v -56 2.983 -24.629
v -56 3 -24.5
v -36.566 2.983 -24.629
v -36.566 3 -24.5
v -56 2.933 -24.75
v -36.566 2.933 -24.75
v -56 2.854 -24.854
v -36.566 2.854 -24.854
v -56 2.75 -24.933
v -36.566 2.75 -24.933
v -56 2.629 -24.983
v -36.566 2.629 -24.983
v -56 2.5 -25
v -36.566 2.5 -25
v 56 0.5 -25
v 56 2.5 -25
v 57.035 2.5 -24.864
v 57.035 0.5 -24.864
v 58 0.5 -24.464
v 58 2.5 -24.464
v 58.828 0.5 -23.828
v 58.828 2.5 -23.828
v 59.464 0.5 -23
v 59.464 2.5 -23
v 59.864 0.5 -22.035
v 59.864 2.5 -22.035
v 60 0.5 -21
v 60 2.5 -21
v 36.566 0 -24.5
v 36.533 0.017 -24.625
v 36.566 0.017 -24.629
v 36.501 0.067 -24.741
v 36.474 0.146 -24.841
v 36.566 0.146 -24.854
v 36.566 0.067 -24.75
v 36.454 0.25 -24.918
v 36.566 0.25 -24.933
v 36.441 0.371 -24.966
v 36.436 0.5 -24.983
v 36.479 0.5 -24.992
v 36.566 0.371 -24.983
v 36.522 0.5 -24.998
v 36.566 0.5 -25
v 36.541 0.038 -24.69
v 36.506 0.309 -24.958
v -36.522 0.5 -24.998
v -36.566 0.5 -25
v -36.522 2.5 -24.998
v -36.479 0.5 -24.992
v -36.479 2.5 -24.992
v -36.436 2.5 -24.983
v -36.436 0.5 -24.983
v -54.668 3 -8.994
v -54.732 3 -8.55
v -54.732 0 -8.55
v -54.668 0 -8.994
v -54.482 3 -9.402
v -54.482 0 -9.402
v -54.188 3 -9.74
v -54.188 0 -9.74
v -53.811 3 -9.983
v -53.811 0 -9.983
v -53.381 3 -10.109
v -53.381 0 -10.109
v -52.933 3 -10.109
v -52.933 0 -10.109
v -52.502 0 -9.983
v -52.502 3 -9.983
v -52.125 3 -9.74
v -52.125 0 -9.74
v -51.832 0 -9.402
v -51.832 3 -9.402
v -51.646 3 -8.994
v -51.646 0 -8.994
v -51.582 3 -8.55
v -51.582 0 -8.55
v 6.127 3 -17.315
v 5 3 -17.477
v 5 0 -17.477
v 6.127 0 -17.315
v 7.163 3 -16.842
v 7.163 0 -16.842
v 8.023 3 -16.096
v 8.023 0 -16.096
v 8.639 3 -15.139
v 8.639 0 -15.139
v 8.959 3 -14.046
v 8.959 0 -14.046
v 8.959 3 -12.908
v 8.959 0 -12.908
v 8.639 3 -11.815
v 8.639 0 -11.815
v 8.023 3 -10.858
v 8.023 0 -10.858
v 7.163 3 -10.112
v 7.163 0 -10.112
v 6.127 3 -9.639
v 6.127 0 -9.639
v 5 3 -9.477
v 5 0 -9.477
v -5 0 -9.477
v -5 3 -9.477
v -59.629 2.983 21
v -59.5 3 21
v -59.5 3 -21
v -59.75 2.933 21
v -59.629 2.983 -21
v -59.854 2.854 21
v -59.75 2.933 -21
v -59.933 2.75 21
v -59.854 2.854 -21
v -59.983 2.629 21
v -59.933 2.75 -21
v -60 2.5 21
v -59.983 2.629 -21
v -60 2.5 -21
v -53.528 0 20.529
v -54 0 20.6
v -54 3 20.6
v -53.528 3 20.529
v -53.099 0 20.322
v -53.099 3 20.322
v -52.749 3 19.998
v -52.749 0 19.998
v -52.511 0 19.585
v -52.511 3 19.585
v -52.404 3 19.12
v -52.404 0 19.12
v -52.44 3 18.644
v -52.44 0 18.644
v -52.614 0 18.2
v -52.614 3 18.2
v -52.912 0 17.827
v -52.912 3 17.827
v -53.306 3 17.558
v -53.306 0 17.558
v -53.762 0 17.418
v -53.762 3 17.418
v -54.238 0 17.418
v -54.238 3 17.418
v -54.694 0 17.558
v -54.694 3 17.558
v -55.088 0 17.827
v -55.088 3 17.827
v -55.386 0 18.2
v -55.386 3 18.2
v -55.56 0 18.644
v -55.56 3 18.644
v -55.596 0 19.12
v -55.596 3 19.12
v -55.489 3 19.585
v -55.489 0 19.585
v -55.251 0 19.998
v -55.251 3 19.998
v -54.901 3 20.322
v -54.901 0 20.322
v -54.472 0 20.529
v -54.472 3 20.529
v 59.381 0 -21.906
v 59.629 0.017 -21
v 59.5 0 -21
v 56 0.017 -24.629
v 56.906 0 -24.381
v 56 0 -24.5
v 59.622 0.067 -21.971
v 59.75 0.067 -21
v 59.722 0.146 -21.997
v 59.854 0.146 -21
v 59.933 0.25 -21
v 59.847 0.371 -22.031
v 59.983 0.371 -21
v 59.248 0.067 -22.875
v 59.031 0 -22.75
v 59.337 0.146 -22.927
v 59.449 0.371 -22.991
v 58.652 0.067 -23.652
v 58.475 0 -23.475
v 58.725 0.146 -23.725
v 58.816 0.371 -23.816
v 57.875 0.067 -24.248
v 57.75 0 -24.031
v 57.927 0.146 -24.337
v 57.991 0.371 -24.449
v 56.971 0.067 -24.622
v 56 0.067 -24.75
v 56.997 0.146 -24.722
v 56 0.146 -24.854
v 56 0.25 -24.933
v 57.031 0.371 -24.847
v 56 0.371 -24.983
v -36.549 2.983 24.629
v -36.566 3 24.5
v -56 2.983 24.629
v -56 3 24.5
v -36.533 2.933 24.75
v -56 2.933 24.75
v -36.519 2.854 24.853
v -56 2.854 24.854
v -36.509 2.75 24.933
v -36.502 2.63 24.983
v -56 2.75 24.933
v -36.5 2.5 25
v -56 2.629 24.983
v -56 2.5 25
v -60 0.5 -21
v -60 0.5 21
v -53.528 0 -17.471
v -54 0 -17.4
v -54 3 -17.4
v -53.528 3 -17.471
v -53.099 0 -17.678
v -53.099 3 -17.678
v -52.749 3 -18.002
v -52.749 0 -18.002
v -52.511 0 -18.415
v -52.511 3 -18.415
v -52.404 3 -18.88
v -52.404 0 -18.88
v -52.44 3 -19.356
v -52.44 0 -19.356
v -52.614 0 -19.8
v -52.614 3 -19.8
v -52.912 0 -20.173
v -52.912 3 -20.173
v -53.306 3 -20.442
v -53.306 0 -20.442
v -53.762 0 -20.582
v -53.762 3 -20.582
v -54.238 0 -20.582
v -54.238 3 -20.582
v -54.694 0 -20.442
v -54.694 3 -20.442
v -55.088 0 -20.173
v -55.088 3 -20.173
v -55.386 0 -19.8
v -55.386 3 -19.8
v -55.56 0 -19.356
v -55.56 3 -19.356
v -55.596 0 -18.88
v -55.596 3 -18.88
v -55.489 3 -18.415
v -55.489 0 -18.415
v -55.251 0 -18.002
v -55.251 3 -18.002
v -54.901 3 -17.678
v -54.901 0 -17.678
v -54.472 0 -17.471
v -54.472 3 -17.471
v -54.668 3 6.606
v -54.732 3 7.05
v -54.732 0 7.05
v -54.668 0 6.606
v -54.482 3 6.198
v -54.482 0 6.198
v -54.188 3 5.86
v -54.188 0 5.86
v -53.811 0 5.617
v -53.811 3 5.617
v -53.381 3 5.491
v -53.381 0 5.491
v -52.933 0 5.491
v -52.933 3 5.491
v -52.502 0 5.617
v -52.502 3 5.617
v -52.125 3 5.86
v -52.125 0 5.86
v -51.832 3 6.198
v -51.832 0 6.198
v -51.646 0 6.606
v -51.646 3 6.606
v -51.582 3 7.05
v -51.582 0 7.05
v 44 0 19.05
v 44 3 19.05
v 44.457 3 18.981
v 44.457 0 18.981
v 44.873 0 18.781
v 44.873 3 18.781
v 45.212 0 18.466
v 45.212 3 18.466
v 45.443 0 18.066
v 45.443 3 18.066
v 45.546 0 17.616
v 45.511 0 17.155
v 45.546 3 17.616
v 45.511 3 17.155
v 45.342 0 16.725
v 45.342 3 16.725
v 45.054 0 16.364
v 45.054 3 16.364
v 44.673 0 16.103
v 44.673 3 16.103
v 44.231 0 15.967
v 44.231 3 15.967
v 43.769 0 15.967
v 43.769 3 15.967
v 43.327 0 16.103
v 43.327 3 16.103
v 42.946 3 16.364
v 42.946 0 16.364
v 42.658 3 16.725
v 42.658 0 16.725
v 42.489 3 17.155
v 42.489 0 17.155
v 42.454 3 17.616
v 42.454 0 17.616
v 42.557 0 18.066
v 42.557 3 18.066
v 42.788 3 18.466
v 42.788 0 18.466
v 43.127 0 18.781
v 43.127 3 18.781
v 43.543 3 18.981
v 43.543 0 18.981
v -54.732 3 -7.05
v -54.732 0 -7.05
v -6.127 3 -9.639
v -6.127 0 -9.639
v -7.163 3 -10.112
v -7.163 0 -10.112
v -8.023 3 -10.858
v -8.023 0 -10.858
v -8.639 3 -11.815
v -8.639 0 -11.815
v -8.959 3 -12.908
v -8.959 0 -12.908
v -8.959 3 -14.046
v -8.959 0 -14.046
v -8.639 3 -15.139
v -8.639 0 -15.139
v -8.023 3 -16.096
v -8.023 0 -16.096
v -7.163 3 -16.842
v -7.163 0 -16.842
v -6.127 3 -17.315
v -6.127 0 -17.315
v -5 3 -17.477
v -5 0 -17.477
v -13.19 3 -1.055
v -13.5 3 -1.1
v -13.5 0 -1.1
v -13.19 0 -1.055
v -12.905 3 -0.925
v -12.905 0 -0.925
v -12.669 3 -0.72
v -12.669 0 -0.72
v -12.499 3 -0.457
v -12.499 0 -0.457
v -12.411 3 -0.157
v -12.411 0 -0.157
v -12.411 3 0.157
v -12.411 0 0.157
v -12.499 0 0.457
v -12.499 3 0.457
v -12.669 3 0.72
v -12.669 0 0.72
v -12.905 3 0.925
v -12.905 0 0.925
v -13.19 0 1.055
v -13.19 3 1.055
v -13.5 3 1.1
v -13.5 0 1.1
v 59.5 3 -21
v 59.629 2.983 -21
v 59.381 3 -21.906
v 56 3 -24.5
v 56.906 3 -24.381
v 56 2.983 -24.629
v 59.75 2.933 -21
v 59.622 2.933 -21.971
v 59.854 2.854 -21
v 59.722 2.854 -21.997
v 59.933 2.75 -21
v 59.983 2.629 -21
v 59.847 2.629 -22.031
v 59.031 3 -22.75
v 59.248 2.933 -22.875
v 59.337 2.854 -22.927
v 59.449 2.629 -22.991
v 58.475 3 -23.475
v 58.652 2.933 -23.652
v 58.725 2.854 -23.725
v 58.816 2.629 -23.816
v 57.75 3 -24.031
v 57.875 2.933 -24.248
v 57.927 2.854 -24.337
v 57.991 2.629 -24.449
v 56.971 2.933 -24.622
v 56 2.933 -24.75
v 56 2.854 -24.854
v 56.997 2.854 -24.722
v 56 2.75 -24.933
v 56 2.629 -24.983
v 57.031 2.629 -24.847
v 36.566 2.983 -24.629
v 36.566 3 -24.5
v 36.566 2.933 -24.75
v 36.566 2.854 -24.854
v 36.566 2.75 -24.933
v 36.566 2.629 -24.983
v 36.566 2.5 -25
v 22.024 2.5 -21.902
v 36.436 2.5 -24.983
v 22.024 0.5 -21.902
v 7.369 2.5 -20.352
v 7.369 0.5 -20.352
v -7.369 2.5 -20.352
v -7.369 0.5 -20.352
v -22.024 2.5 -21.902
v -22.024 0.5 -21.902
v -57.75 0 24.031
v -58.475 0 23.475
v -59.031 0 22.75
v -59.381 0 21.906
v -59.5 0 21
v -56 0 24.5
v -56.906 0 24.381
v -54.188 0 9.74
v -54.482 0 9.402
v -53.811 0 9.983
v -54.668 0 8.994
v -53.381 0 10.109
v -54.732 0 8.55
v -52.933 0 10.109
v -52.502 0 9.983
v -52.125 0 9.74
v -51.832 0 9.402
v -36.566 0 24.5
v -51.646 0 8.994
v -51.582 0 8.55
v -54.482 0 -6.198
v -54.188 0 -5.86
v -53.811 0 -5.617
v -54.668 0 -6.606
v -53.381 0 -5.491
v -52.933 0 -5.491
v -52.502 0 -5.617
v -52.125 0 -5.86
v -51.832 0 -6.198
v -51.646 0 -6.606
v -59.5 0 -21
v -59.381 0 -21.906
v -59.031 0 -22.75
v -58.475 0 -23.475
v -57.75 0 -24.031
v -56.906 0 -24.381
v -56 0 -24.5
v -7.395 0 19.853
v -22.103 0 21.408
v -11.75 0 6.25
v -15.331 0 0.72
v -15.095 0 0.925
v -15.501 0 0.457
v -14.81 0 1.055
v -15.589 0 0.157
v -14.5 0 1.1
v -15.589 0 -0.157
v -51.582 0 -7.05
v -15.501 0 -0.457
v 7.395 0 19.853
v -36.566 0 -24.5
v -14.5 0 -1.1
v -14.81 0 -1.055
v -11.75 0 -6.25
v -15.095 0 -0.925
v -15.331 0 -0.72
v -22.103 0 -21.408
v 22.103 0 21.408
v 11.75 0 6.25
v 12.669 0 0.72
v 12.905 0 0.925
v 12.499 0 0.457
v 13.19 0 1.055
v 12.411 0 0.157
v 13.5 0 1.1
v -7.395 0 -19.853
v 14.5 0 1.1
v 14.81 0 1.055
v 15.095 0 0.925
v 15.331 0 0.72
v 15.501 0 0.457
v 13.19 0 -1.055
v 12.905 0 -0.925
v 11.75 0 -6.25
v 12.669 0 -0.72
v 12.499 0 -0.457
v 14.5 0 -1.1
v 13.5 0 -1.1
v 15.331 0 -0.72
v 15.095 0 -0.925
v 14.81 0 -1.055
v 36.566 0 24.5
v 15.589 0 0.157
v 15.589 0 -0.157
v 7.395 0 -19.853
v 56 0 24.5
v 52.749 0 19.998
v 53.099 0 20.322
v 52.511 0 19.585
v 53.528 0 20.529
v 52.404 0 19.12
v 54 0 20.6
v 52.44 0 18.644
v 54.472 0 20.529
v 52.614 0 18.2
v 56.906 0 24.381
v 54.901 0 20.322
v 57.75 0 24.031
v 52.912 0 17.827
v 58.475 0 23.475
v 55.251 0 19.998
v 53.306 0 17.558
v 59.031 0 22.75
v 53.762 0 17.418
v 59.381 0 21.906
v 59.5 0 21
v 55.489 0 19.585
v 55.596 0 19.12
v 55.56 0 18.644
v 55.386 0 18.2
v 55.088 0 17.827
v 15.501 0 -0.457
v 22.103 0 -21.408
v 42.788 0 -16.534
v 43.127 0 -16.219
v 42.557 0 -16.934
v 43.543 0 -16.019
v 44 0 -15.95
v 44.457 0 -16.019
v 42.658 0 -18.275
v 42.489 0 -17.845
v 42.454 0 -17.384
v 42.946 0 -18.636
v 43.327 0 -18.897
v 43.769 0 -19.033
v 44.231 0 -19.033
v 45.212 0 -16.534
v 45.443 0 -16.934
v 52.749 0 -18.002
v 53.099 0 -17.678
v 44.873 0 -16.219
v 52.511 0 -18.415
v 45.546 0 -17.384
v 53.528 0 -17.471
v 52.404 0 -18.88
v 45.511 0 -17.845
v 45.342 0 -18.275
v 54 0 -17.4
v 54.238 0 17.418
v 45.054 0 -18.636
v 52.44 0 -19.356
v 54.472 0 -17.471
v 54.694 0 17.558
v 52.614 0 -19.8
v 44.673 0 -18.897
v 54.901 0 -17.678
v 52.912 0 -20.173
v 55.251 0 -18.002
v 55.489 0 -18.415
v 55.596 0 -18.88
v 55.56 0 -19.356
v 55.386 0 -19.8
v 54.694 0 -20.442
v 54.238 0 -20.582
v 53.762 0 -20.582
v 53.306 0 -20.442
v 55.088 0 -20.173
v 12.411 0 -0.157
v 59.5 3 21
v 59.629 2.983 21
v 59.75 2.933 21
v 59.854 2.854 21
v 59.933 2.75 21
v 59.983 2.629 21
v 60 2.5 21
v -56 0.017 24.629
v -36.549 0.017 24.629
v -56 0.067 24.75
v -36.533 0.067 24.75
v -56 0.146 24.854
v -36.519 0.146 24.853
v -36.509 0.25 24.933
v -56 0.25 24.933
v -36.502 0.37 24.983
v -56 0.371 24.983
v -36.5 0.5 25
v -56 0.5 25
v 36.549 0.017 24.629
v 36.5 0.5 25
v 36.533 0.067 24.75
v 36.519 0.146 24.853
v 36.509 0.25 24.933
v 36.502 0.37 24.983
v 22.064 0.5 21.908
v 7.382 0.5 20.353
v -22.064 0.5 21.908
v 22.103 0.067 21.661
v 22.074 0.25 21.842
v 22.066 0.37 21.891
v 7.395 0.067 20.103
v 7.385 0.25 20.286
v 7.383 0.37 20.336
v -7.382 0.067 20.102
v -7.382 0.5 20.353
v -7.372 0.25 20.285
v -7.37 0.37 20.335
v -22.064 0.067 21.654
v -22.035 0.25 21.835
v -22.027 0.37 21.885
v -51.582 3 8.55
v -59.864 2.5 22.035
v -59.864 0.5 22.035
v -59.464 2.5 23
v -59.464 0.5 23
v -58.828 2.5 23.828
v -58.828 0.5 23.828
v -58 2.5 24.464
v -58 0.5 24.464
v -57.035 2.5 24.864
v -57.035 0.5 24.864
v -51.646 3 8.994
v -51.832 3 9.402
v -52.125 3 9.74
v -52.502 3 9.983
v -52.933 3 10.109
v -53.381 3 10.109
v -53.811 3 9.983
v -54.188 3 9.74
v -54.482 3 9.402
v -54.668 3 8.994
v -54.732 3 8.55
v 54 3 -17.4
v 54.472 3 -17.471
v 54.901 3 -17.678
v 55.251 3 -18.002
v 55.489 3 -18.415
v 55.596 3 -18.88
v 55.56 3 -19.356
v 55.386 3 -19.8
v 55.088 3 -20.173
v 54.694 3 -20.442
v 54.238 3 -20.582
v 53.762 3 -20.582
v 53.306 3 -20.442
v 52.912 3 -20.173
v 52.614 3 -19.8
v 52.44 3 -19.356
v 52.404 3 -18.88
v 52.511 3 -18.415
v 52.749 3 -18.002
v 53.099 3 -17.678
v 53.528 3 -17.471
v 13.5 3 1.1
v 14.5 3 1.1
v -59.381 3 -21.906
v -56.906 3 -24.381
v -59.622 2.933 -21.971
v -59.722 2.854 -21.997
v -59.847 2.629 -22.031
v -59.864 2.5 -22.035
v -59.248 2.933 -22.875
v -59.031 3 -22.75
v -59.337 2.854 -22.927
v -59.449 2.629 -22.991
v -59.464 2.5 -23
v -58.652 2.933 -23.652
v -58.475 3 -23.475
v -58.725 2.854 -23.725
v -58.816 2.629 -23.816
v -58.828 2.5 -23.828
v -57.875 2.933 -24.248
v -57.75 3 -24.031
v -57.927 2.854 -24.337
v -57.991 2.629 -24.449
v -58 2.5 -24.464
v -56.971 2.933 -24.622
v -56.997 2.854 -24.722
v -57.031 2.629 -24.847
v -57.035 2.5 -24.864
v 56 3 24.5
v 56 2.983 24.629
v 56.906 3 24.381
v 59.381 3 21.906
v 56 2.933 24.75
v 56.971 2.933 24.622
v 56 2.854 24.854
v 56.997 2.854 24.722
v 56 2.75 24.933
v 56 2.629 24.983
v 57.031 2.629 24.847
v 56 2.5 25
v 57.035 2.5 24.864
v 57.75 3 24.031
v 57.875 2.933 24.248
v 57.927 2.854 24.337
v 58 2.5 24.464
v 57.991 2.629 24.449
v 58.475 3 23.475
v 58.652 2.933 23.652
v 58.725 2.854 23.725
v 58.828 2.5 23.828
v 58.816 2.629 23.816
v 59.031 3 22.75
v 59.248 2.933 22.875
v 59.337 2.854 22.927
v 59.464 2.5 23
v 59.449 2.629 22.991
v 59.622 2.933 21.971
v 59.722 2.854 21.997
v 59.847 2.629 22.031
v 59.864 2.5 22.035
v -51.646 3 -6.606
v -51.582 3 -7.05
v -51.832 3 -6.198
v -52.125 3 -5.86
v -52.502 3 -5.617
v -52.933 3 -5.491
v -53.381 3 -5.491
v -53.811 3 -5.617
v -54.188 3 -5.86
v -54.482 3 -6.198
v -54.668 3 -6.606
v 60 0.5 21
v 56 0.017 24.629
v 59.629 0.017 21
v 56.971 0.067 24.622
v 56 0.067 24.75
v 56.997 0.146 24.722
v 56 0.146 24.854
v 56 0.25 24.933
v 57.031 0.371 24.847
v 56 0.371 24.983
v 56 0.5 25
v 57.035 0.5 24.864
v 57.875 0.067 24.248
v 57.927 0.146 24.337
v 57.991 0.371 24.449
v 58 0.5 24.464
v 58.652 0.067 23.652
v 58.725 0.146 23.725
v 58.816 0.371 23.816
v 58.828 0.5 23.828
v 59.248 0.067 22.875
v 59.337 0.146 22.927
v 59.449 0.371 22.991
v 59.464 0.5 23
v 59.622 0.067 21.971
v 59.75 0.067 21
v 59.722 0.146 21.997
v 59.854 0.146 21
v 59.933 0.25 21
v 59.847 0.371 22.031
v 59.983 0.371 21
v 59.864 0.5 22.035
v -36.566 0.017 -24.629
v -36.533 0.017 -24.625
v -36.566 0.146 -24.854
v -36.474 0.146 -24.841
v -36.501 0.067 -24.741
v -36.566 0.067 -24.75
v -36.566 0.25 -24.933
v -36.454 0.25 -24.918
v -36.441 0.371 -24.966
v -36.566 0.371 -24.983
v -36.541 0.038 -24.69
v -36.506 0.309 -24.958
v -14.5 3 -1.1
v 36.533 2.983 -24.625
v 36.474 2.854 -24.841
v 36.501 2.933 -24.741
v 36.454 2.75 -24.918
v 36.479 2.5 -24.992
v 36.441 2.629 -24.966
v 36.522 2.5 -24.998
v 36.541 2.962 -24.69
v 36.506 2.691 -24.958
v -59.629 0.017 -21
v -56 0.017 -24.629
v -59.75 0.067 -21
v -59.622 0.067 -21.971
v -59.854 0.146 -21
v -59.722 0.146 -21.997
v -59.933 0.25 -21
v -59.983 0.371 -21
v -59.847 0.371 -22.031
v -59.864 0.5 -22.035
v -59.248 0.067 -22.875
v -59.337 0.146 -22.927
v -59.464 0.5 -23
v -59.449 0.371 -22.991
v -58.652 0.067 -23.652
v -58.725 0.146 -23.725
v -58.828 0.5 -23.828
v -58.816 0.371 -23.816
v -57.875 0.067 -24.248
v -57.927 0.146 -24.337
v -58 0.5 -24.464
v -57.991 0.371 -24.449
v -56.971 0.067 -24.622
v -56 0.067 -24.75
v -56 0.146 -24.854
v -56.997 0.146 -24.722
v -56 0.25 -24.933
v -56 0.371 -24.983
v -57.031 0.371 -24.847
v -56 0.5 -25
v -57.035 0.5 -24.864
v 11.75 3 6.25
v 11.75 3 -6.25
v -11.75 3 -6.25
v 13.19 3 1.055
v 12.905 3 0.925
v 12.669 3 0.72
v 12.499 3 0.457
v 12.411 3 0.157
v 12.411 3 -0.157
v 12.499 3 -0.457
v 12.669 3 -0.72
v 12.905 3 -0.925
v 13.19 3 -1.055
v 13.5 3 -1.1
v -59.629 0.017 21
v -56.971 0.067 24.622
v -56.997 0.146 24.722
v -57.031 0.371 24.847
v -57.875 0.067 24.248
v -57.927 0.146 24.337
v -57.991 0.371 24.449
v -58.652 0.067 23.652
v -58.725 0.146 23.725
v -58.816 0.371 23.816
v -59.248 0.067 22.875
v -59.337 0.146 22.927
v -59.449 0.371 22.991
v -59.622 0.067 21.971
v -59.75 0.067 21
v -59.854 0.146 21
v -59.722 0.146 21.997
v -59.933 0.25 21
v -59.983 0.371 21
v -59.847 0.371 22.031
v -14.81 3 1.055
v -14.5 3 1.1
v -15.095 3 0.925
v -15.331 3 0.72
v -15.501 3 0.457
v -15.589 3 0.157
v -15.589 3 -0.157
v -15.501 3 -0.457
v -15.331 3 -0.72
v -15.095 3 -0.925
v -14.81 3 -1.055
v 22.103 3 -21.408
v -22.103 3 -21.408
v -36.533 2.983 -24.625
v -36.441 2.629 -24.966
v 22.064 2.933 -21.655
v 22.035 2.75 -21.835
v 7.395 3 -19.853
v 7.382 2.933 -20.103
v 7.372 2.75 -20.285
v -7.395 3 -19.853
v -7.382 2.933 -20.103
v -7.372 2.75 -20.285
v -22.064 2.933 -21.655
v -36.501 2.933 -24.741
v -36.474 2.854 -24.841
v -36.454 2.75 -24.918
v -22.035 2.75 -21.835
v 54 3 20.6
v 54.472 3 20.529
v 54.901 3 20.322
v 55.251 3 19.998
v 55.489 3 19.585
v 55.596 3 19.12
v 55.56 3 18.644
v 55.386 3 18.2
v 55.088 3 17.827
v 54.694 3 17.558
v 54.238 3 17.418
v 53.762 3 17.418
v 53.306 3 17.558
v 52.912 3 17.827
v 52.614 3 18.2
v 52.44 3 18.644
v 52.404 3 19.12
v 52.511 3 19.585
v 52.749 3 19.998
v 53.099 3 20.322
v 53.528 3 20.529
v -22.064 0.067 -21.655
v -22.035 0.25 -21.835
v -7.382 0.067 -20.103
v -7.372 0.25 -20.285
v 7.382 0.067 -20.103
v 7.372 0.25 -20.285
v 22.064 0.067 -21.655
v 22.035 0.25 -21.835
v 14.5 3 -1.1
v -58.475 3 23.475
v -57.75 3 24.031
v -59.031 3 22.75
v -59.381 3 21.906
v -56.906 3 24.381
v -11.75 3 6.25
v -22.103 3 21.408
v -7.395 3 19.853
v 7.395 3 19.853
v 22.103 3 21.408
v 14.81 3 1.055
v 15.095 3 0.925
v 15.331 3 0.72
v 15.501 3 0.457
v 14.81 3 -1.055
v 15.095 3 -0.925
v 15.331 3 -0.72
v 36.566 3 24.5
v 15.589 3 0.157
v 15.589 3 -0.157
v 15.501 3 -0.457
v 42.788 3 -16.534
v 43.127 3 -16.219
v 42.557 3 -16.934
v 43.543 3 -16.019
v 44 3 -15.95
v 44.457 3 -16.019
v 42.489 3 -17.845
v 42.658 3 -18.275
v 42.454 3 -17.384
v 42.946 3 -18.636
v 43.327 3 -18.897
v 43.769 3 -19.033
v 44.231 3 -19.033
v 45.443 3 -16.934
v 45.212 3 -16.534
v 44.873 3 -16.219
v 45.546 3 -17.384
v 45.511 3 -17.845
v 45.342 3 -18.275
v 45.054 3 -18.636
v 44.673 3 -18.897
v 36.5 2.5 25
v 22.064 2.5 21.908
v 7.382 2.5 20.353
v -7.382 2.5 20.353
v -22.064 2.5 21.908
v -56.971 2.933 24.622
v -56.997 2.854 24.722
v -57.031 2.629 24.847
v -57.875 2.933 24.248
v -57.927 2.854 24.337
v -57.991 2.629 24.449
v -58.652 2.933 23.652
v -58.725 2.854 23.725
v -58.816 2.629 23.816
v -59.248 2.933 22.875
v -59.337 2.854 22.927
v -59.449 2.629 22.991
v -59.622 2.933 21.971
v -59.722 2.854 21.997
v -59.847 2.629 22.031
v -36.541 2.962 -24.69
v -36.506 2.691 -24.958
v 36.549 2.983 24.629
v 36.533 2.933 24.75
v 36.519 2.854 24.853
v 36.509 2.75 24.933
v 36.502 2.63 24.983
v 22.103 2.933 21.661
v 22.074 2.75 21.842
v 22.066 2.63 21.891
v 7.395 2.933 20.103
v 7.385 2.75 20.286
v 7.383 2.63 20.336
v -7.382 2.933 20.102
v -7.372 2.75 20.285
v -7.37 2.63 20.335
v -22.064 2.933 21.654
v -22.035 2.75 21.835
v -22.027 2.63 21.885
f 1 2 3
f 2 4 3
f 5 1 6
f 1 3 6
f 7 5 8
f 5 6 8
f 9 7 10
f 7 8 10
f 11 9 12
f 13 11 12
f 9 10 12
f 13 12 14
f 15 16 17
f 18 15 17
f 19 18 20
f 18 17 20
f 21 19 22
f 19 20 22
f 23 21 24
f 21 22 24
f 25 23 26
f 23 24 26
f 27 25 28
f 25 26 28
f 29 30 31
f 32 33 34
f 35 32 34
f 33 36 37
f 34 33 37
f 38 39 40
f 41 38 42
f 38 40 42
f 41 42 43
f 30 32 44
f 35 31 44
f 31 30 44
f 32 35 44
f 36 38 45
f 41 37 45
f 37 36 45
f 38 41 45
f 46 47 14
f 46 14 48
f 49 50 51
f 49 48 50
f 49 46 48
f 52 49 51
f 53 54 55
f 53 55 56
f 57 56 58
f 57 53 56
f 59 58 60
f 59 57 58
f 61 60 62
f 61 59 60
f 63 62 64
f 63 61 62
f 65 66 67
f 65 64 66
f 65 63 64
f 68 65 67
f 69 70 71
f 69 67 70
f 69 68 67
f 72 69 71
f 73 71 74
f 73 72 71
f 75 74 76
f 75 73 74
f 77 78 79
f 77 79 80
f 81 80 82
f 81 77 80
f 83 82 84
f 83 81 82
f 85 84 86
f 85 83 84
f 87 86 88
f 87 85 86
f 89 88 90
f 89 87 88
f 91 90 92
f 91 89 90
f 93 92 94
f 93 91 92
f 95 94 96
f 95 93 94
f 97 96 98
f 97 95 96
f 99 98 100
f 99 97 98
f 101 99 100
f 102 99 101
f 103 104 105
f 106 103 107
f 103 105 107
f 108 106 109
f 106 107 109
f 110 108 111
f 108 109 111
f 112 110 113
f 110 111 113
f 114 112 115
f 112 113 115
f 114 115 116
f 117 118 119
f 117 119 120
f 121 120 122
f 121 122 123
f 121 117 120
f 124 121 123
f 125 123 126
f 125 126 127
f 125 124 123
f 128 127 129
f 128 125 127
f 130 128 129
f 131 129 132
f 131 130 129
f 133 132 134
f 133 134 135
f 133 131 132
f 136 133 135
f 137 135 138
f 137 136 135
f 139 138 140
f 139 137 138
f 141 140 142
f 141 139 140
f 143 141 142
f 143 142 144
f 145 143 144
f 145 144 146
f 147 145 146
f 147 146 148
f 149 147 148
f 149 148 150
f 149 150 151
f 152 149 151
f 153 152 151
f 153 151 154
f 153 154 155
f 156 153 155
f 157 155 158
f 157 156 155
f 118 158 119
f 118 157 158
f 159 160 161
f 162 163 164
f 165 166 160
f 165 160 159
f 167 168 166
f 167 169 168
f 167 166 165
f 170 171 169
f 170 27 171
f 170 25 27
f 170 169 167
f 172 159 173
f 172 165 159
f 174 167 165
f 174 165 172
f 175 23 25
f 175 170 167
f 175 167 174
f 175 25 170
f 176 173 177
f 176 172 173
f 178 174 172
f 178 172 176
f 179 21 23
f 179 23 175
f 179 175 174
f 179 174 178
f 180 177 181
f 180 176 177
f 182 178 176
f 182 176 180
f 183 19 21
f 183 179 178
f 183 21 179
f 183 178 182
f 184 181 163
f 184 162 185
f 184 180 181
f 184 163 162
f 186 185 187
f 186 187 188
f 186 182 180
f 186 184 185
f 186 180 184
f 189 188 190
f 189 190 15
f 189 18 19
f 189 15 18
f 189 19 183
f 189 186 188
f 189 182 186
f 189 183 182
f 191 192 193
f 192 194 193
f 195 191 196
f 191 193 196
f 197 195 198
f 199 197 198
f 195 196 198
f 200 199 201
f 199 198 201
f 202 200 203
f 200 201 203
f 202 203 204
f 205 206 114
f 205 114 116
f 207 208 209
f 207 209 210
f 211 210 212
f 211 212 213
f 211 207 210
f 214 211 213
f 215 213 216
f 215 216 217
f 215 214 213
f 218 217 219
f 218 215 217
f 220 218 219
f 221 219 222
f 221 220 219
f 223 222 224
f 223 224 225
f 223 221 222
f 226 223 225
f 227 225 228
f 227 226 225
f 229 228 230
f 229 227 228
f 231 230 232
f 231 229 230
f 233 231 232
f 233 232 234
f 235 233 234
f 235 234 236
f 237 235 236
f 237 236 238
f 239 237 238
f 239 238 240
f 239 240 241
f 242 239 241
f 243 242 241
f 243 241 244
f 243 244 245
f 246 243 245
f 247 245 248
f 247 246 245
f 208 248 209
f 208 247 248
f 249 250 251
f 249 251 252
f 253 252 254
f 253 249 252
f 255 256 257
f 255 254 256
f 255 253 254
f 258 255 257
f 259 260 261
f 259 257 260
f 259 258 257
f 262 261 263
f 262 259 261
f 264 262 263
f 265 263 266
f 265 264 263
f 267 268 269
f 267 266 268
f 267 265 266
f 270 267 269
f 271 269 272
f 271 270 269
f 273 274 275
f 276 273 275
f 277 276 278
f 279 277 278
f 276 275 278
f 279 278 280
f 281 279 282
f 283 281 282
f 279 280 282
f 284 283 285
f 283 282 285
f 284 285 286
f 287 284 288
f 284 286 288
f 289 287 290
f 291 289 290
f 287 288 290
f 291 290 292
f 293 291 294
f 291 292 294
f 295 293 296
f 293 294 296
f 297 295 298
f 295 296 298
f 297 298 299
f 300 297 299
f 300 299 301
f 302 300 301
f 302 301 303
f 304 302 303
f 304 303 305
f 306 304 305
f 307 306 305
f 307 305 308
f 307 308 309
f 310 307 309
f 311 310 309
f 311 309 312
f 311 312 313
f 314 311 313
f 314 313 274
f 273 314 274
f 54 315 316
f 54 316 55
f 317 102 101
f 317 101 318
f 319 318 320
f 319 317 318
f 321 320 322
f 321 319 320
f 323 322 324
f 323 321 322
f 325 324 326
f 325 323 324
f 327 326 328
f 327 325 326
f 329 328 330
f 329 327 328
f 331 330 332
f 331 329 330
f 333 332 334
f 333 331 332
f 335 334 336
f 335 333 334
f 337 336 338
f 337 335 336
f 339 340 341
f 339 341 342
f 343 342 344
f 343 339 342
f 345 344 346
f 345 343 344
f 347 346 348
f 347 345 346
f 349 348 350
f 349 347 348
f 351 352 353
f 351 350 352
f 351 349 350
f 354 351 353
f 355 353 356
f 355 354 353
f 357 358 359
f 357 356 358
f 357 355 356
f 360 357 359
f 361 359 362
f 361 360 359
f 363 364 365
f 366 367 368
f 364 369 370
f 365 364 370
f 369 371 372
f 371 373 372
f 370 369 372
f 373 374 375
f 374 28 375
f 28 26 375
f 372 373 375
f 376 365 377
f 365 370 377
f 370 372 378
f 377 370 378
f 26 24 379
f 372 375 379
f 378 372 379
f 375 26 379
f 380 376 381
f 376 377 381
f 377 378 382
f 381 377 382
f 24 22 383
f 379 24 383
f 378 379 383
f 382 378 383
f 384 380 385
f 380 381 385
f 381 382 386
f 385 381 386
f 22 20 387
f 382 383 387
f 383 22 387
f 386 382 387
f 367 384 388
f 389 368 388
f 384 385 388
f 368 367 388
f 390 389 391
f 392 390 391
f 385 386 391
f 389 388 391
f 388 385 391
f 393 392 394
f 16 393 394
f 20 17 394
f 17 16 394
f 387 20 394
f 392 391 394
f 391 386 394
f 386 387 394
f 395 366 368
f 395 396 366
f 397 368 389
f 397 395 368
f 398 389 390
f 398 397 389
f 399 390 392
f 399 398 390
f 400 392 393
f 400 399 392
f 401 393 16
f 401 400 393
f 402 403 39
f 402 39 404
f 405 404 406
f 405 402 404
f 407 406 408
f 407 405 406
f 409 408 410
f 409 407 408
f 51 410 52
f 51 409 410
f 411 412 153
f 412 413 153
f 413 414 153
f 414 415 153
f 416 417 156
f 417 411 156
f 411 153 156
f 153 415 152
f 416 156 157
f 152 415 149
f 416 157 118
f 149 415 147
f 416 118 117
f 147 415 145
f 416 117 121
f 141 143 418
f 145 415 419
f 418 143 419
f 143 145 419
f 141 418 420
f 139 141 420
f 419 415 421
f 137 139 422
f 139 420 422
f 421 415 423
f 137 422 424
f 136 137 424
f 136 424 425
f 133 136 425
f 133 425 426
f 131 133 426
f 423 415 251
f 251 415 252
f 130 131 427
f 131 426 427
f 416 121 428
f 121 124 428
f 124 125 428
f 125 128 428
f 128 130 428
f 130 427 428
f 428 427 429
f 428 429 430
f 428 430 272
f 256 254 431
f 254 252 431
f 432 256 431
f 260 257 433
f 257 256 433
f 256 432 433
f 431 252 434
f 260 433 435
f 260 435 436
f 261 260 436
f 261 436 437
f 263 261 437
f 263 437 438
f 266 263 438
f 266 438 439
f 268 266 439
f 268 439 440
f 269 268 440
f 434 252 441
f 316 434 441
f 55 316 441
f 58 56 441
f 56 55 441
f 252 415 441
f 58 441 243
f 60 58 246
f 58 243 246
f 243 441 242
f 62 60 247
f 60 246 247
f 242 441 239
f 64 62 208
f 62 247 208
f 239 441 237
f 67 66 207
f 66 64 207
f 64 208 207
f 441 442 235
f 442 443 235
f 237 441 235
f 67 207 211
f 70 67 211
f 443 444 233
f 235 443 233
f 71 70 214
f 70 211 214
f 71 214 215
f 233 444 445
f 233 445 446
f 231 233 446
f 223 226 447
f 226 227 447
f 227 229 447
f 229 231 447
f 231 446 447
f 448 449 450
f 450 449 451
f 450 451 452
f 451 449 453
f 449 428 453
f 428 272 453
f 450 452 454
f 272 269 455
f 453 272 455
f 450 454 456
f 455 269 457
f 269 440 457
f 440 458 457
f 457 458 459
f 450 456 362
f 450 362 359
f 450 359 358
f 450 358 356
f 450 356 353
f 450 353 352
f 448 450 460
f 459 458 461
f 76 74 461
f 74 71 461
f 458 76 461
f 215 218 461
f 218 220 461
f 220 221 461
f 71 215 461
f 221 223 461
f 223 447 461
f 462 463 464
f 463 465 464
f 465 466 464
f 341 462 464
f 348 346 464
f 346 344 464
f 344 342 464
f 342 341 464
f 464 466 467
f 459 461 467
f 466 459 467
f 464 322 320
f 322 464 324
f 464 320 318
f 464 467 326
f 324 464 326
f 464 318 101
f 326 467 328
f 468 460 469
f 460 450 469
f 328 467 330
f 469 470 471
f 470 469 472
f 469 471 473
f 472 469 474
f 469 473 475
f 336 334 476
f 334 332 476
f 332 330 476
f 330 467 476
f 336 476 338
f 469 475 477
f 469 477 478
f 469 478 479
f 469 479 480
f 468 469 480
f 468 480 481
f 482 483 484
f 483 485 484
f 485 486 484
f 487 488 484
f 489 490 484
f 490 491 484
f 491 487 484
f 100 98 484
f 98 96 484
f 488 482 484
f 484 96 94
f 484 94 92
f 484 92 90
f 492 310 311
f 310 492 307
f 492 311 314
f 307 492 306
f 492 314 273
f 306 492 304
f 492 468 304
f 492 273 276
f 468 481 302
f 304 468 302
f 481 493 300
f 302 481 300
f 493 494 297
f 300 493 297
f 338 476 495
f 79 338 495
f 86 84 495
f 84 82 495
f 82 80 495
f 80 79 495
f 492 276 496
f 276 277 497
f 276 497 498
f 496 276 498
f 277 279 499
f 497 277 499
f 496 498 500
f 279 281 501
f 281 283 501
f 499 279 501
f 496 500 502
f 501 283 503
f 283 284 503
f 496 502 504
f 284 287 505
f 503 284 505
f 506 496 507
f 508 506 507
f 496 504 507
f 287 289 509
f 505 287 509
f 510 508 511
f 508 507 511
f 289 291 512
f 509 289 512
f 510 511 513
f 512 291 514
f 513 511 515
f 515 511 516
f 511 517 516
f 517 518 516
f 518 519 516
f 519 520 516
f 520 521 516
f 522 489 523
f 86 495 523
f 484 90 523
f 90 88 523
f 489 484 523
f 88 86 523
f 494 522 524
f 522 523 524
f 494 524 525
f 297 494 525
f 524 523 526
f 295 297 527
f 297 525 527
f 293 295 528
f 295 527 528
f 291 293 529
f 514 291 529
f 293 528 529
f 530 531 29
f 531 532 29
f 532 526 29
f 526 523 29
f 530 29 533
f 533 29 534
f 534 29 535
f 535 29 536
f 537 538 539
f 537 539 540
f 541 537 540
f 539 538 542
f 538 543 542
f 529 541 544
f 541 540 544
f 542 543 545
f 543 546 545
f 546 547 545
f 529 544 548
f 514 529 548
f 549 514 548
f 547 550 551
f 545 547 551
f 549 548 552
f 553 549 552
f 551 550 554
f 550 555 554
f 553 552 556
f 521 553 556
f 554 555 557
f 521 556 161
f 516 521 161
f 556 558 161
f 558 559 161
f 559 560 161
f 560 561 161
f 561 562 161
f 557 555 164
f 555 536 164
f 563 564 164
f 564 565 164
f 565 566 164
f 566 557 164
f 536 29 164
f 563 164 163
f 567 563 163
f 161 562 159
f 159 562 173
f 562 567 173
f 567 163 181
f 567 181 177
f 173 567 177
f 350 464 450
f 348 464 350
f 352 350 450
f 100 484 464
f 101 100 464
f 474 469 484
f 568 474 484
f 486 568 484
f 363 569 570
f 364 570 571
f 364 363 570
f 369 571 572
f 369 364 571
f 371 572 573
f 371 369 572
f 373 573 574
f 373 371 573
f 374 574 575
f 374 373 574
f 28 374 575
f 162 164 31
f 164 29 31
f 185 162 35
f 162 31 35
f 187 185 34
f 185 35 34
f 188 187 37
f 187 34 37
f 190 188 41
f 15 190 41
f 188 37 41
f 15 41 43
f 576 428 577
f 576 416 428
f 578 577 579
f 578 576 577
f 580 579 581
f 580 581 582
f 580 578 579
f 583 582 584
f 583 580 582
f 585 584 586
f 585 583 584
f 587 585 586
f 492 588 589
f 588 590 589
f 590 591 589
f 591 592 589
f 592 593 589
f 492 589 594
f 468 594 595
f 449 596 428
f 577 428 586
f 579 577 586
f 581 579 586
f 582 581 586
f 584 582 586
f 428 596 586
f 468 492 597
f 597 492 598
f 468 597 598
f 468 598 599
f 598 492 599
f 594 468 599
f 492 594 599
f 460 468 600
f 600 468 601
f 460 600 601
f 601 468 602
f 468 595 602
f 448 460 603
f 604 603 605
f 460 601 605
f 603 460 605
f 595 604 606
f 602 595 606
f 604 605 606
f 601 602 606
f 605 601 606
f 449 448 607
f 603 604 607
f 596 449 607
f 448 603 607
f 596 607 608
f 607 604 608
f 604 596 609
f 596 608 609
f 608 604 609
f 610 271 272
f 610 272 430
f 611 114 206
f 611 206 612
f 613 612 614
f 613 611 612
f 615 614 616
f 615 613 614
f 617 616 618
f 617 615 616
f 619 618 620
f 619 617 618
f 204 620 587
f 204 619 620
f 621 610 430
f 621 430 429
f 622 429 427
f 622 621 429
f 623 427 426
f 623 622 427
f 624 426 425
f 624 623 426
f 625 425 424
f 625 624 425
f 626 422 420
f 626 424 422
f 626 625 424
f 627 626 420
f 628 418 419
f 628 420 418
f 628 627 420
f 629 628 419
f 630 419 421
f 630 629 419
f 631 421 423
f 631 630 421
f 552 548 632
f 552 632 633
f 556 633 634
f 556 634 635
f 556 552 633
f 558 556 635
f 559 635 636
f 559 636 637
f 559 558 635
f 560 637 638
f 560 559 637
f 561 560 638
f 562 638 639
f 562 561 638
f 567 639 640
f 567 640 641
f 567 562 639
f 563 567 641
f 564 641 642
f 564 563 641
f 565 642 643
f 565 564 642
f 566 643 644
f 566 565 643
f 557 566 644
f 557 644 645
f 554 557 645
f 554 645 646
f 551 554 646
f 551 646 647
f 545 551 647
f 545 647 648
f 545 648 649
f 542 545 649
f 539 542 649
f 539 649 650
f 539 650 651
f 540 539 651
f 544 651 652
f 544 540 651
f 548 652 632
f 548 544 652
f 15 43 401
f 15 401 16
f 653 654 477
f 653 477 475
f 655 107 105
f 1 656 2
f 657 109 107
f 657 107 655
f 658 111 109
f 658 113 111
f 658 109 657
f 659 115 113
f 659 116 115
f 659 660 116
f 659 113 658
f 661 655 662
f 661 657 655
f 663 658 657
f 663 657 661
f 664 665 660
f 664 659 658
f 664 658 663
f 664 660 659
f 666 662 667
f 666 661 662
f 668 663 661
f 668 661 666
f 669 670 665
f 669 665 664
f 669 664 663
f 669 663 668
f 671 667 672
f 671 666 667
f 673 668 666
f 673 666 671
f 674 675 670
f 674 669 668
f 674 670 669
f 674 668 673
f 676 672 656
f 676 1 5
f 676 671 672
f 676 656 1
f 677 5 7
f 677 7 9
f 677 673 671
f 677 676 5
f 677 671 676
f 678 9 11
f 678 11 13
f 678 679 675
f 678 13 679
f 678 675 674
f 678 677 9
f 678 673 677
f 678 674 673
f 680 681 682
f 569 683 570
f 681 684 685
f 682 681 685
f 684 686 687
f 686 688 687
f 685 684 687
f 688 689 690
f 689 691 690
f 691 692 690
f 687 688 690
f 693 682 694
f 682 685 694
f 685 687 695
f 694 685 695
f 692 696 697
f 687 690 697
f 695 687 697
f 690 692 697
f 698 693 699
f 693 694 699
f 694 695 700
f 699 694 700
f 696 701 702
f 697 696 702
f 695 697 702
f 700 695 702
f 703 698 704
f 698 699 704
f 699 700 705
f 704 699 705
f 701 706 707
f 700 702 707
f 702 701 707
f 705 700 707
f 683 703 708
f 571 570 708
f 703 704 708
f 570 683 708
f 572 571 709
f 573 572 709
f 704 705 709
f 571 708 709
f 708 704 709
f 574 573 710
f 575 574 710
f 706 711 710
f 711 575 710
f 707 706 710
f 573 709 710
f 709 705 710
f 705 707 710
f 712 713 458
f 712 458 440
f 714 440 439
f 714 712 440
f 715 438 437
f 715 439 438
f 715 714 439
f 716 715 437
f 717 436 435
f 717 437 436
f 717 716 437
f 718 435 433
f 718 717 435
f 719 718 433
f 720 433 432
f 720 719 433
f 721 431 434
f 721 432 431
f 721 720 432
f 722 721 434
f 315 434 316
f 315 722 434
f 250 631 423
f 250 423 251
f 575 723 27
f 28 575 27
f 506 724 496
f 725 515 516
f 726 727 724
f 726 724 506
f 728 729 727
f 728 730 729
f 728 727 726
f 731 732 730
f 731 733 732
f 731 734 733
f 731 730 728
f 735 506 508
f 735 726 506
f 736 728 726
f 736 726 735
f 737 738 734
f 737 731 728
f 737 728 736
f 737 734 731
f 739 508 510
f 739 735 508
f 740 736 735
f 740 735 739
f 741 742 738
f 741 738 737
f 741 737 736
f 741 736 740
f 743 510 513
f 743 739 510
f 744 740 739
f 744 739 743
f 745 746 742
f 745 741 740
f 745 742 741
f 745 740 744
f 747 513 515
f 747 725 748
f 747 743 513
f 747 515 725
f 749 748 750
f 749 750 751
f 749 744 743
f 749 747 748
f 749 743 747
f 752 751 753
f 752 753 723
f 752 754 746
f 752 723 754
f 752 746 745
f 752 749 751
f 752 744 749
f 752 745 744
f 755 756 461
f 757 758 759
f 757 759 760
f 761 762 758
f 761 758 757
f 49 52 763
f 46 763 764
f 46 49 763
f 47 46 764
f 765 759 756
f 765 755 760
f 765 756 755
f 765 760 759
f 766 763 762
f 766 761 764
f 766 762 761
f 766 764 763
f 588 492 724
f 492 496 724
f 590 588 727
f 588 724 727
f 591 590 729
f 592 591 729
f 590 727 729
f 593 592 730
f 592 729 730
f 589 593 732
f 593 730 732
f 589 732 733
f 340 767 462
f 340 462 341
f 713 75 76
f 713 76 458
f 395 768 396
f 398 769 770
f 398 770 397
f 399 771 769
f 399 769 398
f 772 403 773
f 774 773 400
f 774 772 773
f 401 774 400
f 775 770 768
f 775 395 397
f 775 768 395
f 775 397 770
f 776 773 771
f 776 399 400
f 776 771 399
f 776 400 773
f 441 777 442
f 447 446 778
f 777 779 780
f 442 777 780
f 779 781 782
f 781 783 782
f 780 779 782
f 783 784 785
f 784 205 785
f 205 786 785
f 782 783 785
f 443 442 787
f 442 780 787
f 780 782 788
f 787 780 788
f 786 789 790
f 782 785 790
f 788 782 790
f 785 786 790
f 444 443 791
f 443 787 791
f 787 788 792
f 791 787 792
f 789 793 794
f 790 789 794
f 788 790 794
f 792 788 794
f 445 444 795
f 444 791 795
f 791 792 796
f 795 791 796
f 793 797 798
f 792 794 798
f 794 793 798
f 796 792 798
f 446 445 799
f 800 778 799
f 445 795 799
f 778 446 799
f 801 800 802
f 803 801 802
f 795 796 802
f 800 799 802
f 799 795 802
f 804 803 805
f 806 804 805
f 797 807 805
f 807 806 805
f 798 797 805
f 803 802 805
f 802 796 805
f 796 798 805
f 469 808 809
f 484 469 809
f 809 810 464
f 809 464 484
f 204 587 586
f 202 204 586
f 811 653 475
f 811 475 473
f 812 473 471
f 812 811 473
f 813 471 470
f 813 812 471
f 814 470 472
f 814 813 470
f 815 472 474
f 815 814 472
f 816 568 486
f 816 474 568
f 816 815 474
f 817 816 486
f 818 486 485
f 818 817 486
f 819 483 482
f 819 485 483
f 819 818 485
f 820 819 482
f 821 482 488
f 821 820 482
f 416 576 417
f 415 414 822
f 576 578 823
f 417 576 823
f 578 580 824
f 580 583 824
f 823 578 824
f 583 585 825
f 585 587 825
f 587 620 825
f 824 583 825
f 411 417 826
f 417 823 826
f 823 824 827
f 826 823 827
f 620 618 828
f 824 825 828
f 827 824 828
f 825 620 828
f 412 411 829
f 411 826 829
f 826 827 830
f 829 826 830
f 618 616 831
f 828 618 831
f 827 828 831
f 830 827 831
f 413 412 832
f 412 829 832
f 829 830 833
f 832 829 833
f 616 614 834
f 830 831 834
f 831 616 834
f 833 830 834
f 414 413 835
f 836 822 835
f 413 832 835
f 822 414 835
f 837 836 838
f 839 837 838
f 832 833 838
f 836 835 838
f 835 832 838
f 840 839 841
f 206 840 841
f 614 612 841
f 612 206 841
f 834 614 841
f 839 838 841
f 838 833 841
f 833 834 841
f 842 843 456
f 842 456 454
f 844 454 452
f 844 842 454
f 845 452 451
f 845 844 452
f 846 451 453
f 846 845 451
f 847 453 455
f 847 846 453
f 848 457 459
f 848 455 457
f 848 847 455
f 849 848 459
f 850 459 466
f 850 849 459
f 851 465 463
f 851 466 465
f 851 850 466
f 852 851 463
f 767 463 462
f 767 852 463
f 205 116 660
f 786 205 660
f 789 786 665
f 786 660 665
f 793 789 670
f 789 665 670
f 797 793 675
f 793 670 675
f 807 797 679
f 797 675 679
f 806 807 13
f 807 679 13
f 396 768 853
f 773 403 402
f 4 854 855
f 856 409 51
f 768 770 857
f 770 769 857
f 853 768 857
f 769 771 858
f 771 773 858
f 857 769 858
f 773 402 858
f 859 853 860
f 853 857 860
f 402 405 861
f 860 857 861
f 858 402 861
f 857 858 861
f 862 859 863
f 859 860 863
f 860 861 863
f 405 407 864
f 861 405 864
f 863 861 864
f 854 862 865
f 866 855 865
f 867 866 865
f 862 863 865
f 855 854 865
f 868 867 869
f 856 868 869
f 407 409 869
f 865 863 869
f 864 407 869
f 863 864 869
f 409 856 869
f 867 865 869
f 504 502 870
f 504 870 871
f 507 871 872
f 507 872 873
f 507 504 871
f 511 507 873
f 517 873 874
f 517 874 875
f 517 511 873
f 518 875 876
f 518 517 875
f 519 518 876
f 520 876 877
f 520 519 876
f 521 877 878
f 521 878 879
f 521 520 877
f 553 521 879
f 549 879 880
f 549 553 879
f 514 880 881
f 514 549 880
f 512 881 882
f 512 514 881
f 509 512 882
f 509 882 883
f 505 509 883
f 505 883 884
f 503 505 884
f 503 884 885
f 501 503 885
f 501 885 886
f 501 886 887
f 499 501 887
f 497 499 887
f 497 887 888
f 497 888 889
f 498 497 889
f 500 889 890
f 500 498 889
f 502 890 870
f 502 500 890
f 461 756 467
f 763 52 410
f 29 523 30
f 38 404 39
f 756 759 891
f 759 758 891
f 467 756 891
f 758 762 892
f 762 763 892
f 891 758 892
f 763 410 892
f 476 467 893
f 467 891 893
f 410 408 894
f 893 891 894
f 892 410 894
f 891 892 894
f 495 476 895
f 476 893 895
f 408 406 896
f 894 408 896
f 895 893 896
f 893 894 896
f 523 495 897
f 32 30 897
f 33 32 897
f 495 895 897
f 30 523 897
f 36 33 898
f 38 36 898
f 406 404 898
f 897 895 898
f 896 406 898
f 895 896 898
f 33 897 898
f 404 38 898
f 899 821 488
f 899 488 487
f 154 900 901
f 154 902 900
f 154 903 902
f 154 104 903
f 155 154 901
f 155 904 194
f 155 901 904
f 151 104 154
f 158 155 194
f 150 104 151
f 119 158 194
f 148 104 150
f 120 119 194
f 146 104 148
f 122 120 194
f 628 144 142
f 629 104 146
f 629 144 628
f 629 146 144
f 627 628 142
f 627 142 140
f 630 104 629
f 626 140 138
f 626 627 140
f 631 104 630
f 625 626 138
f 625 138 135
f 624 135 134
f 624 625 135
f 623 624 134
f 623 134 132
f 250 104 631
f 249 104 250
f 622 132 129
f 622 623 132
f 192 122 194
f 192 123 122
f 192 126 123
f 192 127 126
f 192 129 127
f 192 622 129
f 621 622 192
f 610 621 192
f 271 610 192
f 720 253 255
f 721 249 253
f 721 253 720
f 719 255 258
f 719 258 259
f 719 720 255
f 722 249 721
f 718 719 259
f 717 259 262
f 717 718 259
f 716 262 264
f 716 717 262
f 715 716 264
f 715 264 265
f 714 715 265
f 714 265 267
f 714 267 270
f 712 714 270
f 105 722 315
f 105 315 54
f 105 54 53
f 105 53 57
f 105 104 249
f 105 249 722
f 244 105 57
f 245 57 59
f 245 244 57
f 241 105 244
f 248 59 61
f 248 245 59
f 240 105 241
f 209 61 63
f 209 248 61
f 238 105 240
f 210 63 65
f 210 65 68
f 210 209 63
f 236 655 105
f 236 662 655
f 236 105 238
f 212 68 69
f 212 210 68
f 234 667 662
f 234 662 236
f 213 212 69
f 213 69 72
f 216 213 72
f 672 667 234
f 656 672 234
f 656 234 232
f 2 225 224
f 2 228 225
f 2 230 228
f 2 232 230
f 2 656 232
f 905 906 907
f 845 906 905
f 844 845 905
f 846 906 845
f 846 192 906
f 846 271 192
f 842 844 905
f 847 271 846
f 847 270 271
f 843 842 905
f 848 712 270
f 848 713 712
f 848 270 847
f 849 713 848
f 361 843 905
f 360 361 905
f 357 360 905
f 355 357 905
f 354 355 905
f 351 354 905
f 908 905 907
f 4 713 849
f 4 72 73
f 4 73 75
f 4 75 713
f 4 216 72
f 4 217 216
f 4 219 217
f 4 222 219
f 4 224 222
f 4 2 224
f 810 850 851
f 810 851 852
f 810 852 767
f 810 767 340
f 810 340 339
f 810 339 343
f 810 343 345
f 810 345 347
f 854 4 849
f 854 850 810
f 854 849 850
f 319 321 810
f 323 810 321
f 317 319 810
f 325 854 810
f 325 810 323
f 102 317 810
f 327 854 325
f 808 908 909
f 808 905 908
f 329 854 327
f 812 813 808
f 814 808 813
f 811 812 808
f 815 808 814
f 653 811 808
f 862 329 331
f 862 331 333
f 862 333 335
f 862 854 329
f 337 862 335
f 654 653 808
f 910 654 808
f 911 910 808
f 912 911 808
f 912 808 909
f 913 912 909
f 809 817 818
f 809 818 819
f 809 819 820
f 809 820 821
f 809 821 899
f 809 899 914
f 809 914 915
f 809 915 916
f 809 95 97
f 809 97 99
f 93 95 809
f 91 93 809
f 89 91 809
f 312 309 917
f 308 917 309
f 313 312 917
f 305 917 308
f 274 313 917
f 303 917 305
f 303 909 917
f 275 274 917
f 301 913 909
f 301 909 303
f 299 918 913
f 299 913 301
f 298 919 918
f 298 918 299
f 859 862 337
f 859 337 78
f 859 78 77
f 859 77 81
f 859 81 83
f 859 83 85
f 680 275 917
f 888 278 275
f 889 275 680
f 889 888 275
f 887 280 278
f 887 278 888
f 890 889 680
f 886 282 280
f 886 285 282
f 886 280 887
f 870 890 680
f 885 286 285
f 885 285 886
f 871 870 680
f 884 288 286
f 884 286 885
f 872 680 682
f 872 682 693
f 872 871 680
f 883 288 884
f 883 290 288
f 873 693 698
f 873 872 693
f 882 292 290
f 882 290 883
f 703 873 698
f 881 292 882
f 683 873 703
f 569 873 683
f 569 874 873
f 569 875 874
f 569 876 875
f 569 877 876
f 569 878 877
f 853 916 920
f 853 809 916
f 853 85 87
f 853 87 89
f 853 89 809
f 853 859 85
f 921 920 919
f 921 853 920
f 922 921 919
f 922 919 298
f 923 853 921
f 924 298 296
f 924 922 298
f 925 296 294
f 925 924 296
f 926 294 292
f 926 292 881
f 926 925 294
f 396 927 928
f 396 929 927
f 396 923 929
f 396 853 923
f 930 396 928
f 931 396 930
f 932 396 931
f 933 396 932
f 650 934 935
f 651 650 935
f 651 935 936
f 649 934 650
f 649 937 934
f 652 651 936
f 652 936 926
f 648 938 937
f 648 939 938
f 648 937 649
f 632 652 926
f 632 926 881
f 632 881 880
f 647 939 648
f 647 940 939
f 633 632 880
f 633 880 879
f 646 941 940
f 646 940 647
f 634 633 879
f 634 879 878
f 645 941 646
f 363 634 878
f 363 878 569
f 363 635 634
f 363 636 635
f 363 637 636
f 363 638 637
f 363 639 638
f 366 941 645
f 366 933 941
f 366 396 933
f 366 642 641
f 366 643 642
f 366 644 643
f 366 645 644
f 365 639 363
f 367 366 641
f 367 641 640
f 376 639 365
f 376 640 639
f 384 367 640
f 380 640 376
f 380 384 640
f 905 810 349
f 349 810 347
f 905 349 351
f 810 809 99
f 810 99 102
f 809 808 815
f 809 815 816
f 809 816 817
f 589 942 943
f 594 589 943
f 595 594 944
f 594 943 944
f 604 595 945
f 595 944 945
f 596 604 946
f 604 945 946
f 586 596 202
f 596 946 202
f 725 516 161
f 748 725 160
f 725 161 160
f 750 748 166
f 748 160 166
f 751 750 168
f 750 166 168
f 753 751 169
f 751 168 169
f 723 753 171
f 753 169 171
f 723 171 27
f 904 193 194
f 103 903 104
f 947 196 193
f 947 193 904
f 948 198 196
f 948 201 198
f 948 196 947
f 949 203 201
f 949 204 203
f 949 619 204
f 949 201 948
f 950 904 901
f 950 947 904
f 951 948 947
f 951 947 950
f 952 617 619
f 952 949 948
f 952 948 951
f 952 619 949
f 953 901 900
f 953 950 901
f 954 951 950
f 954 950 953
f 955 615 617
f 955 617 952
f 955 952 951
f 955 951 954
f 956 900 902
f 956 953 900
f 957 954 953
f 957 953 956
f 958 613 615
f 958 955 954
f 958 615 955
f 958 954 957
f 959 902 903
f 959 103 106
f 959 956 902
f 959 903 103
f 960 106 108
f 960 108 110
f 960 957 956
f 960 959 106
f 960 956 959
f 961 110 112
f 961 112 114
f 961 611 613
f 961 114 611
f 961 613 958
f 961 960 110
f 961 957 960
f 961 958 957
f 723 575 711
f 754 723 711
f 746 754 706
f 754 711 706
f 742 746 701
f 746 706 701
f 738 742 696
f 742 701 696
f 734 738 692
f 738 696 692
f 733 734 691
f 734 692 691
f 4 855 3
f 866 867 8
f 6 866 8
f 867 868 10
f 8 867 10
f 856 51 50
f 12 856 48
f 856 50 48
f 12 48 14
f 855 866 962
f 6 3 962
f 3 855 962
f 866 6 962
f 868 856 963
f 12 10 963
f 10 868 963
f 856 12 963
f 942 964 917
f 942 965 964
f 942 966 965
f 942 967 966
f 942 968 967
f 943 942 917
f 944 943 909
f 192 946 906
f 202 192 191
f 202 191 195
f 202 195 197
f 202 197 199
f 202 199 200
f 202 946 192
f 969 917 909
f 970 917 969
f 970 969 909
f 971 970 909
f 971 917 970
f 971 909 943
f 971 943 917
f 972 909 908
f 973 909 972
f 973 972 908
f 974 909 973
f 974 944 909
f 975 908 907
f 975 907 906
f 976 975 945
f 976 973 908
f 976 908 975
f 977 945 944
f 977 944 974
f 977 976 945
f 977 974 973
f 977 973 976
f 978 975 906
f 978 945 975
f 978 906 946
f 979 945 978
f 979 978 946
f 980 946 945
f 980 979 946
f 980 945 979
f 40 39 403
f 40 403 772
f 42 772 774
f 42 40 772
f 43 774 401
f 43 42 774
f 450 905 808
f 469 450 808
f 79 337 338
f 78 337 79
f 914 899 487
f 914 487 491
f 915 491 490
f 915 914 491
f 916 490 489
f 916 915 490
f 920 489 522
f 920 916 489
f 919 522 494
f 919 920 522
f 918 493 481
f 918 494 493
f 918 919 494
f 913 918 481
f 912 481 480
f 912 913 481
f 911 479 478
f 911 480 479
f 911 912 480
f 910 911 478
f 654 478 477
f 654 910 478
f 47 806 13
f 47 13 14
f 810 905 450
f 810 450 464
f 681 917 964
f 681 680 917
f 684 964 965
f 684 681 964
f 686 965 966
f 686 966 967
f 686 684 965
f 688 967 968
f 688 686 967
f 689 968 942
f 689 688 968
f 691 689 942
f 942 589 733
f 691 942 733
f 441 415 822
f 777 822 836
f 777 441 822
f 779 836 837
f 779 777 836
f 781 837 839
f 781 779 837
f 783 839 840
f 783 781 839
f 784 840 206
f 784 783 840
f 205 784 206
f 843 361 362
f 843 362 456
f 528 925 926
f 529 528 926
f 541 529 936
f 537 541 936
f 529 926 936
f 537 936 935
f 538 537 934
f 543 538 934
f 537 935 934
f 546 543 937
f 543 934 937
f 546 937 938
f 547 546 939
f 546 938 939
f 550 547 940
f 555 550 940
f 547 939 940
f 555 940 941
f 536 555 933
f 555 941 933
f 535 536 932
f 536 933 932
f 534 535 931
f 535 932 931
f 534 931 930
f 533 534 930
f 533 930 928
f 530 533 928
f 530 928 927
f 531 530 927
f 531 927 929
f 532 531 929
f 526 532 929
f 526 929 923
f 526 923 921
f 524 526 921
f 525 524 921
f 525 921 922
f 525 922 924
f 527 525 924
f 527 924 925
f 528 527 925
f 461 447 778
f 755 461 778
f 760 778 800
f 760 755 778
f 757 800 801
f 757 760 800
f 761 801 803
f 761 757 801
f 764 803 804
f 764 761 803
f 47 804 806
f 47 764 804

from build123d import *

# Parameters (mm, degrees)
SKETCH1_W           = 120
SKETCH1_H           = 50
SKETCH1_R           = 1.6
BOSS_EXTRUDE1_DEPTH = 3
SKETCH2_R           = 1.55
SKETCH2_W           = 23.5
SKETCH2_H           = 12.5
CUT_EXTRUDE1_DEPTH  = 10
CUT_EXTRUDE2_DEPTH  = 10
FILLET1_R           = 4
FILLET2_R           = 0.5


with BuildPart() as part:
    # Sketch1 → Boss-Extrude1 (new body)
    with BuildSketch(Plane(origin=(0, 0, 0), x_dir=(1, 0, 0), z_dir=(0, 1, 0))):
        Rectangle(SKETCH1_W, SKETCH1_H)
        with Locations(Location((-54, 19, 0), (0, 0, 270))):
            Circle(SKETCH1_R, mode=Mode.SUBTRACT)
        with Locations(Location((54, 19, 0), (0, 0, 270))):
            Circle(SKETCH1_R, mode=Mode.SUBTRACT)
        with Locations(Location((54, -19, 0), (0, 0, 270))):
            Circle(SKETCH1_R, mode=Mode.SUBTRACT)
        with Locations(Location((-54, -19, 0), (0, 0, 270))):
            Circle(SKETCH1_R, mode=Mode.SUBTRACT)
    extrude(amount=BOSS_EXTRUDE1_DEPTH)

    # Sketch2 → Cut-Extrude1 (cut)
    with BuildSketch(Plane(origin=(0, 3, 0), x_dir=(1, 0, 0), z_dir=(0, 1, 0))):
        with Locations(Location((44, 17.5, 0), (0, 0, 270))):
            Circle(SKETCH2_R)
        with Locations(Location((44, -17.5, 0), (0, 0, 270))):
            Circle(SKETCH2_R)
        with BuildLine():
            Line((-54.73176855, 7.05), (-54.73176855, 8.55))
            ThreePointArc((-54.73176855, 8.55), (-53.15676855, 10.125), (-51.58176855, 8.55))
            Line((-51.58176855, 8.55), (-51.58176855, 7.05))
            ThreePointArc((-51.58176855, 7.05), (-53.15676855, 5.475), (-54.73176855, 7.05))
        make_face()
        with BuildLine():
            Line((-51.58176855, -7.05), (-51.58176855, -8.55))
            ThreePointArc((-51.58176855, -8.55), (-53.15676855, -10.125), (-54.73176855, -8.55))
            Line((-54.73176855, -8.55), (-54.73176855, -7.05))
            ThreePointArc((-54.73176855, -7.05), (-53.15676855, -5.475), (-51.58176855, -7.05))
        make_face()
        Rectangle(SKETCH2_W, SKETCH2_H)
        with BuildLine():
            Line((-5, 17.476998697), (5, 17.476998697))
            ThreePointArc((5, 17.476998697), (9, 13.476998697), (5, 9.476998697))
            Line((5, 9.476998697), (-5, 9.476998697))
            ThreePointArc((-5, 9.476998697), (-9, 13.476998697), (-5, 17.476998697))
        make_face()
        with BuildLine():
            Line((-14.5, 1.1), (-13.5, 1.1))
            ThreePointArc((-13.5, 1.1), (-12.4, 0), (-13.5, -1.1))
            Line((-13.5, -1.1), (-14.5, -1.1))
            ThreePointArc((-14.5, -1.1), (-15.6, 0), (-14.5, 1.1))
        make_face()
        with BuildLine():
            Line((13.5, 1.1), (14.5, 1.1))
            ThreePointArc((14.5, 1.1), (15.6, 0), (14.5, -1.1))
            Line((14.5, -1.1), (13.5, -1.1))
            ThreePointArc((13.5, -1.1), (12.4, 0), (13.5, 1.1))
        make_face()
    extrude(amount=-CUT_EXTRUDE1_DEPTH, mode=Mode.SUBTRACT)

    # Sketch4 → Cut-Extrude2 (cut)
    with BuildSketch(Plane(origin=(0, 3, 0), x_dir=(1, 0, 0), z_dir=(0, 1, 0))):
        with BuildLine():
            Line((-36.5, -25), (36.5, -25))
            ThreePointArc((36.5, -25), (0, -20.158240592), (-36.5, -25))
        make_face()
        with BuildLine():
            Line((-36.5, 25), (36.5, 25))
            ThreePointArc((36.5, 25), (0, 20.158240592), (-36.5, 25))
        make_face()
    extrude(amount=-CUT_EXTRUDE2_DEPTH, mode=Mode.SUBTRACT)

    # Fillet1
    fillet1_edges = [part.edges().sort_by_distance(p)[0] for p in [
        (60, 1.5, 25),
        (-60, 1.5, 25),
        (-60, 1.5, -25),
        (60, 1.5, -25),
    ]]
    fillet(fillet1_edges, radius=FILLET1_R)

    # Fillet2
    fillet2_edges = [part.edges().sort_by_distance(p)[0] for p in [
        (46.25, 0, 25),
        (46.25, 3, 25),
        (-46.25, 0, -25),
        (-46.25, 3, -25),
        (-36.5, 1.5, -25),
        (36.5, 1.5, -25),
        (0, 0, 20.158240592),
        (0, 3, 20.158240592),
        (0, 0, -20.158240592),
        (0, 3, -20.158240592),
        (-46.25, 0, 25),
        (-46.25, 3, 25),
        (-60, 0, 0),
        (46.25, 0, -25),
        (60, 0, 0),
        (58.828427125, 0, -23.828427125),
        (-58.828427125, 0, -23.828427125),
        (58.828427125, 0, 23.828427125),
        (-58.828427125, 0, 23.828427125),
        (-60, 3, 0),
        (60, 3, 0),
        (46.25, 3, -25),
        (58.828427125, 3, -23.828427125),
        (-58.828427125, 3, -23.828427125),
        (58.828427125, 3, 23.828427125),
        (-58.828427125, 3, 23.828427125),
    ]]
    fillet(fillet2_edges, radius=FILLET2_R)


solid = part.part
